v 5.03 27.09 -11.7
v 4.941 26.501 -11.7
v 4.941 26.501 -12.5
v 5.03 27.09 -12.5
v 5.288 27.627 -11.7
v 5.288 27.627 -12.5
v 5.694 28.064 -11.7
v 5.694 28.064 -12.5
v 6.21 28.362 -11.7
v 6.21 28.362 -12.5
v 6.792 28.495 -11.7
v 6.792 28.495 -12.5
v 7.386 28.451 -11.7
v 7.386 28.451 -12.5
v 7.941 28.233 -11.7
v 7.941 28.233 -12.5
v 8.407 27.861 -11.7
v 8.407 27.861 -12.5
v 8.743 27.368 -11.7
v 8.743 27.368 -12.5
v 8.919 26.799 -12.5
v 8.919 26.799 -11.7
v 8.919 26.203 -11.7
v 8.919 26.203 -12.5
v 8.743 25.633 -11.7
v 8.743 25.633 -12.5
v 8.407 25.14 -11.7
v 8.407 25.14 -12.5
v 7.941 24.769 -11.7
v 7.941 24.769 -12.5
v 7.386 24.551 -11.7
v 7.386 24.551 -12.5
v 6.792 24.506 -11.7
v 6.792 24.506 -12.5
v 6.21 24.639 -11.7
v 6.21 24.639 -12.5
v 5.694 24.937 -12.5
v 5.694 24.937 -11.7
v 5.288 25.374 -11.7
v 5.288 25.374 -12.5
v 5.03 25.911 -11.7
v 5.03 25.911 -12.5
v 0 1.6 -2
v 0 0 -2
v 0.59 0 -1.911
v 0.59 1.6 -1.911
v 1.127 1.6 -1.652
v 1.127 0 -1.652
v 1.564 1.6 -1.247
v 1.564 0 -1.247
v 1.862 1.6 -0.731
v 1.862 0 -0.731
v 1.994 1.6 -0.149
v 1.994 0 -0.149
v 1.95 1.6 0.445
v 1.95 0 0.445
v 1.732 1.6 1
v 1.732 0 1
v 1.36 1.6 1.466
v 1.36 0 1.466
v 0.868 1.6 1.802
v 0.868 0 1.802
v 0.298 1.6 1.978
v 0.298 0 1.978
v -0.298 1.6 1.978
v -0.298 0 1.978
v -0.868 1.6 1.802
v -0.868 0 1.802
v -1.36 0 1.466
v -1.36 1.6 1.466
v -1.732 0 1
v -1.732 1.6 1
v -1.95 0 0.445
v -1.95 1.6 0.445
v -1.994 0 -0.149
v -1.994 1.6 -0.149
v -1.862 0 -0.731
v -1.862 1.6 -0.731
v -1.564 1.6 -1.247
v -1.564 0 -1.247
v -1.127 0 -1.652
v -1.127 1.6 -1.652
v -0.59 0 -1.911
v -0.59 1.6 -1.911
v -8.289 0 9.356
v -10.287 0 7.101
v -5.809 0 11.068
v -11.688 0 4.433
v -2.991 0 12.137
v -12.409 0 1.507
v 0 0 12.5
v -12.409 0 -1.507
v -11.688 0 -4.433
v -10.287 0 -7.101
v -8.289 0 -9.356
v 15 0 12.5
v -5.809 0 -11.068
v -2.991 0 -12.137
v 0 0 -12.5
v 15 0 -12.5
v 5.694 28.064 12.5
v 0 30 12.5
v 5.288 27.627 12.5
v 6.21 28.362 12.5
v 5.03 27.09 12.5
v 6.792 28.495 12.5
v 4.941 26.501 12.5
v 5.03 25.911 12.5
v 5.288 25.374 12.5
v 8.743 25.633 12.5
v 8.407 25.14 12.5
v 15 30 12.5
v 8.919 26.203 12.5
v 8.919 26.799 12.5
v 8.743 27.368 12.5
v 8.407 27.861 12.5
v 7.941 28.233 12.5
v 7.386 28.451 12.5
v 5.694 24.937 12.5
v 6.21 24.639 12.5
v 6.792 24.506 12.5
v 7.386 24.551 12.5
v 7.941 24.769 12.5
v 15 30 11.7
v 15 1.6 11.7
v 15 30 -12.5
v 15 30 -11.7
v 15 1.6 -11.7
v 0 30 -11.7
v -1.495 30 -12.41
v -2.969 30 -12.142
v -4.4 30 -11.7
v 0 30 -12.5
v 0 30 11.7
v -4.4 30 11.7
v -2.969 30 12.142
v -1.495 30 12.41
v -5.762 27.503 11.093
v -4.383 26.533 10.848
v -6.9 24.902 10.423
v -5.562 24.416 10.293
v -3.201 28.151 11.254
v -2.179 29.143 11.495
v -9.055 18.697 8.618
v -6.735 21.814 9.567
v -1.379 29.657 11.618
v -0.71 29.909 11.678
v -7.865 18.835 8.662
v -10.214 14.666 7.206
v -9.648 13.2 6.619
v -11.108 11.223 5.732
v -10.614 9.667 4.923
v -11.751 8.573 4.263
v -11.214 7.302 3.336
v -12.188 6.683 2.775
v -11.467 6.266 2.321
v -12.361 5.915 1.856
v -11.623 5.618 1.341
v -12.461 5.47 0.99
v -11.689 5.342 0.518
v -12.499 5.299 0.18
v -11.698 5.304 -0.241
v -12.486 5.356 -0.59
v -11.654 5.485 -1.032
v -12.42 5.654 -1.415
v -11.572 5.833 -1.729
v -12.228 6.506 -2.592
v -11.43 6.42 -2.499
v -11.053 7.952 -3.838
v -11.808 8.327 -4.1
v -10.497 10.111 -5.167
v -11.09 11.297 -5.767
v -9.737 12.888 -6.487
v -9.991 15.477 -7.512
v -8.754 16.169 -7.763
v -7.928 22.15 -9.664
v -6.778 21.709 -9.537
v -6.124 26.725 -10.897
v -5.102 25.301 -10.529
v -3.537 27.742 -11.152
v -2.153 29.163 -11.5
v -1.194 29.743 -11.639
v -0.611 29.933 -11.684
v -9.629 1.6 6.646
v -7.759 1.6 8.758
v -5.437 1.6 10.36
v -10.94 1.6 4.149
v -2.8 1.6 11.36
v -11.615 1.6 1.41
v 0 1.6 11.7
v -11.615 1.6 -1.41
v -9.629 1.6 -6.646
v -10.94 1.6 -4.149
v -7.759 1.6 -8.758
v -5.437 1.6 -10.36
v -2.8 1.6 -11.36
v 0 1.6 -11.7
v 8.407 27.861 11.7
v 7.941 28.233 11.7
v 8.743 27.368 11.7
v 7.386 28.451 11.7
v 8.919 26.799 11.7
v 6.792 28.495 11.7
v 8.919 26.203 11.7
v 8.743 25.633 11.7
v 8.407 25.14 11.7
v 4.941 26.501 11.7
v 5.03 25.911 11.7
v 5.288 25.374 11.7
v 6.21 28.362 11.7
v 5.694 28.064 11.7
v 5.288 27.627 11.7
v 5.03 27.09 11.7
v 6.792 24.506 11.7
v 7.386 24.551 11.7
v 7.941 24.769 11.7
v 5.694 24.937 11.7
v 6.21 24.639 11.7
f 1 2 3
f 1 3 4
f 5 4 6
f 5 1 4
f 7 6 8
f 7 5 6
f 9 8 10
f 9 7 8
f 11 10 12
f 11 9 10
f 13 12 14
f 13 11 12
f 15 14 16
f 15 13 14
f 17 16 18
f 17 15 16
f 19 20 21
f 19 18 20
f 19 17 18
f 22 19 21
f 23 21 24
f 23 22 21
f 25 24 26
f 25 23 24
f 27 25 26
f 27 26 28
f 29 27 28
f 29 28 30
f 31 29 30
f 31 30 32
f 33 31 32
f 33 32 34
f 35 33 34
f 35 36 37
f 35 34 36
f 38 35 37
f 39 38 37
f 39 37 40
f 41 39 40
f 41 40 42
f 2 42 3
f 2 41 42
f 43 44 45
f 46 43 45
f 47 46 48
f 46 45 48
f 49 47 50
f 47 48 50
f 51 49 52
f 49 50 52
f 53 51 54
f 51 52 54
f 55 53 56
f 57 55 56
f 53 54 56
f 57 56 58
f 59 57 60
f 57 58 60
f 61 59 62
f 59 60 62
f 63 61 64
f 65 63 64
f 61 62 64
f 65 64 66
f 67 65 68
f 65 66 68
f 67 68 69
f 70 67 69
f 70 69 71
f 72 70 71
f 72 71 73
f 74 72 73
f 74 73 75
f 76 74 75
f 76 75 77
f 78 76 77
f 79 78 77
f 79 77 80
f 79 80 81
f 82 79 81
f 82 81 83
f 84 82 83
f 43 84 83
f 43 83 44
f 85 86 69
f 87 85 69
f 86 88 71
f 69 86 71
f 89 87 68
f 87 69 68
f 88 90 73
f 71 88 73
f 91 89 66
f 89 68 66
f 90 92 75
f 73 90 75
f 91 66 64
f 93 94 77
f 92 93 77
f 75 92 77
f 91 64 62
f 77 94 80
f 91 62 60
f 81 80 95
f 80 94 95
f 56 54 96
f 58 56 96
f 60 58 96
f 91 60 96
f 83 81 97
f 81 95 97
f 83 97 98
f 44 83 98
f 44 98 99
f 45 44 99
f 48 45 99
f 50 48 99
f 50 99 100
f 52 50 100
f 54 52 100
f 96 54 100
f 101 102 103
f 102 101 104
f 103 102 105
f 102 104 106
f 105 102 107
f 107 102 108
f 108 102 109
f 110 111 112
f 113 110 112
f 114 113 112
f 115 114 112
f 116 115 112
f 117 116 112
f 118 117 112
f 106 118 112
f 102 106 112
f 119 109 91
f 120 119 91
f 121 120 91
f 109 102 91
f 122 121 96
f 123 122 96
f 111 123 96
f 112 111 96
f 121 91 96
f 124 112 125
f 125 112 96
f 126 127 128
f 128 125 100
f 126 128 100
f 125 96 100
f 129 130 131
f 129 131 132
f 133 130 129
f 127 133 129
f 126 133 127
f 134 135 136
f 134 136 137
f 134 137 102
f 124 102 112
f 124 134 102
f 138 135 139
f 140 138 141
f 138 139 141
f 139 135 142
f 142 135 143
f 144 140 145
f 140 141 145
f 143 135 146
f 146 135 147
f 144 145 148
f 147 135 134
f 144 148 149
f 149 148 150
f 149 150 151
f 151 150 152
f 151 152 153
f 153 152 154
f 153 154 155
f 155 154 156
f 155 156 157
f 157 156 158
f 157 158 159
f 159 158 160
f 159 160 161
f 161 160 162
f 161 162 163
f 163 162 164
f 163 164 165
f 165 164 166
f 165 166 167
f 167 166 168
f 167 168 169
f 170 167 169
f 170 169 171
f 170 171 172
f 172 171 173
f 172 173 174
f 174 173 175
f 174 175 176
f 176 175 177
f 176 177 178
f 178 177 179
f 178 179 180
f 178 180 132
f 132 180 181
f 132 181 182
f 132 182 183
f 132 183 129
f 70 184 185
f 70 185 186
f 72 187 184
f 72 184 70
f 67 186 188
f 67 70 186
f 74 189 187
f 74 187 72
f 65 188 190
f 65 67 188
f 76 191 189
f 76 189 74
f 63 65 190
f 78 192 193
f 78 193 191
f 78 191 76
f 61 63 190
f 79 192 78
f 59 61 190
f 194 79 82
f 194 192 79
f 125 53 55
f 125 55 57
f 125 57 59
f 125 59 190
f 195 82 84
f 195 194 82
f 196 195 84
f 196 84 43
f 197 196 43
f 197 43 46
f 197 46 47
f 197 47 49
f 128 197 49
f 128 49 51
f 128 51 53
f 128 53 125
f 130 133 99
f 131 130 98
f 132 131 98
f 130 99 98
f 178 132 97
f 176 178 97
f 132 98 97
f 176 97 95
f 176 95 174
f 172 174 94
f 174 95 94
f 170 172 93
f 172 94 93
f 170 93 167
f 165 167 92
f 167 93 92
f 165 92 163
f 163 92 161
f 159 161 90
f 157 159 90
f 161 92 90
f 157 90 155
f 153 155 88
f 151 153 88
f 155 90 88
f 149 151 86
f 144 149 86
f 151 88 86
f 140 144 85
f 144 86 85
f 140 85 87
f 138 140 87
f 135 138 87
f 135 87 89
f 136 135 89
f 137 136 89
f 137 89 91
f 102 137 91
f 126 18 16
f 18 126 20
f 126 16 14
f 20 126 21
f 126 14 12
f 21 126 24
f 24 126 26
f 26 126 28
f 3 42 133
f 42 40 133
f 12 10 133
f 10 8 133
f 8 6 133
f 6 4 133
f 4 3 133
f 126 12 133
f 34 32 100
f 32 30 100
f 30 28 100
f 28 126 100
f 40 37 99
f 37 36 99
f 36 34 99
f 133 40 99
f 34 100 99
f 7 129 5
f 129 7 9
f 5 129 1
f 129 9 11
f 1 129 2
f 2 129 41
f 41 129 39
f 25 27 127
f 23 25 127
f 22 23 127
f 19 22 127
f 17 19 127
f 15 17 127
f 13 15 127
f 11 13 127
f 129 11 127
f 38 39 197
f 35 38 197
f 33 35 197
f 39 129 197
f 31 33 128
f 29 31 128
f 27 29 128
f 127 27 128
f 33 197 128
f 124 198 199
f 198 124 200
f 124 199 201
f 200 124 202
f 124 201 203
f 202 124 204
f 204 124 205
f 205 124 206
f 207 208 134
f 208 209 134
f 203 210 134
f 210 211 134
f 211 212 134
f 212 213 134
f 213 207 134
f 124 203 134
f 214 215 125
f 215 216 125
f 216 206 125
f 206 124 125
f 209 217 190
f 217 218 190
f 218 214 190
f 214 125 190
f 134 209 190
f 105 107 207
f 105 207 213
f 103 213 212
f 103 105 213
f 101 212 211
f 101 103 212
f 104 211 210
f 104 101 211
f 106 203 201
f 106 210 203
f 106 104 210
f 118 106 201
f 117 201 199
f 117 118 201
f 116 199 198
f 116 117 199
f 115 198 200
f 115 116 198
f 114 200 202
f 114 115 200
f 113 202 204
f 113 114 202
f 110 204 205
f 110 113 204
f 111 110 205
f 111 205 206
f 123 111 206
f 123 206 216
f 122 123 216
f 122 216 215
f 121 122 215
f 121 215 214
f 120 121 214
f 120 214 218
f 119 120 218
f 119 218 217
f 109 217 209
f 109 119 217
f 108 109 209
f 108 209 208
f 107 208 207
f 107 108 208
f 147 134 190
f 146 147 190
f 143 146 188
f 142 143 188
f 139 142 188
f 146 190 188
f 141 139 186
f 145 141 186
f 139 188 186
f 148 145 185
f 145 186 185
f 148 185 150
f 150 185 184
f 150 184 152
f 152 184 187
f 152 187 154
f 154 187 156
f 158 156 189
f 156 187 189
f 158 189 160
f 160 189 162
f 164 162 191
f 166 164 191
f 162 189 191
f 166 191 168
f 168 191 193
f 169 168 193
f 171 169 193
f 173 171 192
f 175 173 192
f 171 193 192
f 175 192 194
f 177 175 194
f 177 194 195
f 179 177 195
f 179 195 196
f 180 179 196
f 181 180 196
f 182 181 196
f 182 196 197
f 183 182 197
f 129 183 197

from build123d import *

# Parameters (mm, degrees)
BOSS_EXTRUDE2_DEPTH     = 30
SKETCH1_5_R             = 11.7
BOSS_EXTRUDE3_DEPTH     = 1.6
CUT_EXTRUDE2_REACH      = 37.795
CUT_EXTRUDE2_END_RADIUS = 12.5
CUT_EXTRUDE3_REACH      = 37.795
SKETCH4_R               = 2
CUT_EXTRUDE4_DEPTH      = 42.833001458
CUT_EXTRUDE4_DEPTH_BACK = 42.833001458
SKETCH5_R               = 2


with BuildPart() as part:
    # Sketch1 → Boss-Extrude2 (new body)
    with BuildSketch(Plane(origin=(0, 0, 0), x_dir=(1, 0, 0), z_dir=(0, 1, 0))):
        with BuildLine():
            ThreePointArc((0, -11.7), (-11.7, 0), (0, 11.7))
            Line((0, 11.7), (13.4, 11.7))
            Line((13.4, 11.7), (15, 11.7))
            Line((15, 11.7), (15, 12.5))
            Line((15, 12.5), (0, 12.5))
            ThreePointArc((0, 12.5), (-12.5, 0), (0, -12.5))
            Line((0, -12.5), (15, -12.5))
            Line((15, -12.5), (15, -11.7))
            Line((15, -11.7), (13.4, -11.7))
            Line((13.4, -11.7), (0, -11.7))
        make_face()
    extrude(amount=BOSS_EXTRUDE2_DEPTH)

    # Sketch1<5> → Boss-Extrude3 (add)
    with BuildSketch(Plane(origin=(0, 0, 0), x_dir=(1, 0, 0), z_dir=(0, 1, 0))):
        with BuildLine():
            Line((13.4, 11.7), (0, 11.7))
            ThreePointArc((0, 11.7), (8.27314934, 8.27314934), (11.7, 0))
            ThreePointArc((11.7, 0), (8.27314934, -8.27314934), (0, -11.7))
            Line((0, -11.7), (13.4, -11.7))
            Line((13.4, -11.7), (15, -11.7))
            Line((15, -11.7), (15, 11.7))
            Line((15, 11.7), (13.4, 11.7))
        make_face()
        Circle(SKETCH1_5_R)
    extrude(amount=BOSS_EXTRUDE3_DEPTH)

    # Cut-Extrude2: up to this cylinder (the profile starts inside it)
    cut_extrude2_end = Plane(origin=(0, 20.117223, 0), z_dir=(0, -1, 0)) * Cylinder(CUT_EXTRUDE2_END_RADIUS, 101.59, mode=Mode.PRIVATE)
    # Sketch3 → Cut-Extrude2 (cut, up to the surface)
    with BuildSketch(Plane(origin=(0, 0, 0), x_dir=(0, 0, -1), z_dir=(1, 0, 0)), mode=Mode.PRIVATE) as cut_extrude2_sk1:
        with BuildLine():
            Line((-11.7, 30), (11.7, 30))
            add(Edge.make_bspline(
                [(-11.7, 30), (0, -19.413885882), (11.7, 30)],
                knots=[0, 0, 0, 1, 1, 1], degree=2))
        make_face()
    cut_extrude2_tool1 = extrude(cut_extrude2_sk1.sketch, amount=-CUT_EXTRUDE2_REACH, mode=Mode.PRIVATE) & cut_extrude2_end
    add(cut_extrude2_tool1.solids().sort_by_distance((0, 20.117223, 0))[0], mode=Mode.SUBTRACT)

    # Sketch4 → Cut-Extrude3 (cut, up to next)
    with BuildSketch(Plane.XZ, mode=Mode.PRIVATE) as cut_extrude3_sk1:
        with Locations(Location((0, 0, 0), (0, 0, 270))):
            Circle(SKETCH4_R)
    cut_extrude3_tool1 = extrude(cut_extrude3_sk1.sketch, amount=-CUT_EXTRUDE3_REACH, mode=Mode.PRIVATE) & part.part
    add(cut_extrude3_tool1.solids().sort_by_distance((0, 0, 0))[0], mode=Mode.SUBTRACT)

    # Sketch5 → Cut-Extrude4 (cut, two sides: drawn at the far end of the back side and taken through both)
    with BuildSketch(Plane(origin=(0, 0, -12.5), x_dir=(-1, 0, 0), z_dir=(0, 0, -1)).offset(-CUT_EXTRUDE4_DEPTH_BACK)):
        with Locations((-6.940962405, 26.50064478)):
            Circle(SKETCH5_R)
    extrude(amount=CUT_EXTRUDE4_DEPTH + CUT_EXTRUDE4_DEPTH_BACK, mode=Mode.SUBTRACT)


solid = part.part
